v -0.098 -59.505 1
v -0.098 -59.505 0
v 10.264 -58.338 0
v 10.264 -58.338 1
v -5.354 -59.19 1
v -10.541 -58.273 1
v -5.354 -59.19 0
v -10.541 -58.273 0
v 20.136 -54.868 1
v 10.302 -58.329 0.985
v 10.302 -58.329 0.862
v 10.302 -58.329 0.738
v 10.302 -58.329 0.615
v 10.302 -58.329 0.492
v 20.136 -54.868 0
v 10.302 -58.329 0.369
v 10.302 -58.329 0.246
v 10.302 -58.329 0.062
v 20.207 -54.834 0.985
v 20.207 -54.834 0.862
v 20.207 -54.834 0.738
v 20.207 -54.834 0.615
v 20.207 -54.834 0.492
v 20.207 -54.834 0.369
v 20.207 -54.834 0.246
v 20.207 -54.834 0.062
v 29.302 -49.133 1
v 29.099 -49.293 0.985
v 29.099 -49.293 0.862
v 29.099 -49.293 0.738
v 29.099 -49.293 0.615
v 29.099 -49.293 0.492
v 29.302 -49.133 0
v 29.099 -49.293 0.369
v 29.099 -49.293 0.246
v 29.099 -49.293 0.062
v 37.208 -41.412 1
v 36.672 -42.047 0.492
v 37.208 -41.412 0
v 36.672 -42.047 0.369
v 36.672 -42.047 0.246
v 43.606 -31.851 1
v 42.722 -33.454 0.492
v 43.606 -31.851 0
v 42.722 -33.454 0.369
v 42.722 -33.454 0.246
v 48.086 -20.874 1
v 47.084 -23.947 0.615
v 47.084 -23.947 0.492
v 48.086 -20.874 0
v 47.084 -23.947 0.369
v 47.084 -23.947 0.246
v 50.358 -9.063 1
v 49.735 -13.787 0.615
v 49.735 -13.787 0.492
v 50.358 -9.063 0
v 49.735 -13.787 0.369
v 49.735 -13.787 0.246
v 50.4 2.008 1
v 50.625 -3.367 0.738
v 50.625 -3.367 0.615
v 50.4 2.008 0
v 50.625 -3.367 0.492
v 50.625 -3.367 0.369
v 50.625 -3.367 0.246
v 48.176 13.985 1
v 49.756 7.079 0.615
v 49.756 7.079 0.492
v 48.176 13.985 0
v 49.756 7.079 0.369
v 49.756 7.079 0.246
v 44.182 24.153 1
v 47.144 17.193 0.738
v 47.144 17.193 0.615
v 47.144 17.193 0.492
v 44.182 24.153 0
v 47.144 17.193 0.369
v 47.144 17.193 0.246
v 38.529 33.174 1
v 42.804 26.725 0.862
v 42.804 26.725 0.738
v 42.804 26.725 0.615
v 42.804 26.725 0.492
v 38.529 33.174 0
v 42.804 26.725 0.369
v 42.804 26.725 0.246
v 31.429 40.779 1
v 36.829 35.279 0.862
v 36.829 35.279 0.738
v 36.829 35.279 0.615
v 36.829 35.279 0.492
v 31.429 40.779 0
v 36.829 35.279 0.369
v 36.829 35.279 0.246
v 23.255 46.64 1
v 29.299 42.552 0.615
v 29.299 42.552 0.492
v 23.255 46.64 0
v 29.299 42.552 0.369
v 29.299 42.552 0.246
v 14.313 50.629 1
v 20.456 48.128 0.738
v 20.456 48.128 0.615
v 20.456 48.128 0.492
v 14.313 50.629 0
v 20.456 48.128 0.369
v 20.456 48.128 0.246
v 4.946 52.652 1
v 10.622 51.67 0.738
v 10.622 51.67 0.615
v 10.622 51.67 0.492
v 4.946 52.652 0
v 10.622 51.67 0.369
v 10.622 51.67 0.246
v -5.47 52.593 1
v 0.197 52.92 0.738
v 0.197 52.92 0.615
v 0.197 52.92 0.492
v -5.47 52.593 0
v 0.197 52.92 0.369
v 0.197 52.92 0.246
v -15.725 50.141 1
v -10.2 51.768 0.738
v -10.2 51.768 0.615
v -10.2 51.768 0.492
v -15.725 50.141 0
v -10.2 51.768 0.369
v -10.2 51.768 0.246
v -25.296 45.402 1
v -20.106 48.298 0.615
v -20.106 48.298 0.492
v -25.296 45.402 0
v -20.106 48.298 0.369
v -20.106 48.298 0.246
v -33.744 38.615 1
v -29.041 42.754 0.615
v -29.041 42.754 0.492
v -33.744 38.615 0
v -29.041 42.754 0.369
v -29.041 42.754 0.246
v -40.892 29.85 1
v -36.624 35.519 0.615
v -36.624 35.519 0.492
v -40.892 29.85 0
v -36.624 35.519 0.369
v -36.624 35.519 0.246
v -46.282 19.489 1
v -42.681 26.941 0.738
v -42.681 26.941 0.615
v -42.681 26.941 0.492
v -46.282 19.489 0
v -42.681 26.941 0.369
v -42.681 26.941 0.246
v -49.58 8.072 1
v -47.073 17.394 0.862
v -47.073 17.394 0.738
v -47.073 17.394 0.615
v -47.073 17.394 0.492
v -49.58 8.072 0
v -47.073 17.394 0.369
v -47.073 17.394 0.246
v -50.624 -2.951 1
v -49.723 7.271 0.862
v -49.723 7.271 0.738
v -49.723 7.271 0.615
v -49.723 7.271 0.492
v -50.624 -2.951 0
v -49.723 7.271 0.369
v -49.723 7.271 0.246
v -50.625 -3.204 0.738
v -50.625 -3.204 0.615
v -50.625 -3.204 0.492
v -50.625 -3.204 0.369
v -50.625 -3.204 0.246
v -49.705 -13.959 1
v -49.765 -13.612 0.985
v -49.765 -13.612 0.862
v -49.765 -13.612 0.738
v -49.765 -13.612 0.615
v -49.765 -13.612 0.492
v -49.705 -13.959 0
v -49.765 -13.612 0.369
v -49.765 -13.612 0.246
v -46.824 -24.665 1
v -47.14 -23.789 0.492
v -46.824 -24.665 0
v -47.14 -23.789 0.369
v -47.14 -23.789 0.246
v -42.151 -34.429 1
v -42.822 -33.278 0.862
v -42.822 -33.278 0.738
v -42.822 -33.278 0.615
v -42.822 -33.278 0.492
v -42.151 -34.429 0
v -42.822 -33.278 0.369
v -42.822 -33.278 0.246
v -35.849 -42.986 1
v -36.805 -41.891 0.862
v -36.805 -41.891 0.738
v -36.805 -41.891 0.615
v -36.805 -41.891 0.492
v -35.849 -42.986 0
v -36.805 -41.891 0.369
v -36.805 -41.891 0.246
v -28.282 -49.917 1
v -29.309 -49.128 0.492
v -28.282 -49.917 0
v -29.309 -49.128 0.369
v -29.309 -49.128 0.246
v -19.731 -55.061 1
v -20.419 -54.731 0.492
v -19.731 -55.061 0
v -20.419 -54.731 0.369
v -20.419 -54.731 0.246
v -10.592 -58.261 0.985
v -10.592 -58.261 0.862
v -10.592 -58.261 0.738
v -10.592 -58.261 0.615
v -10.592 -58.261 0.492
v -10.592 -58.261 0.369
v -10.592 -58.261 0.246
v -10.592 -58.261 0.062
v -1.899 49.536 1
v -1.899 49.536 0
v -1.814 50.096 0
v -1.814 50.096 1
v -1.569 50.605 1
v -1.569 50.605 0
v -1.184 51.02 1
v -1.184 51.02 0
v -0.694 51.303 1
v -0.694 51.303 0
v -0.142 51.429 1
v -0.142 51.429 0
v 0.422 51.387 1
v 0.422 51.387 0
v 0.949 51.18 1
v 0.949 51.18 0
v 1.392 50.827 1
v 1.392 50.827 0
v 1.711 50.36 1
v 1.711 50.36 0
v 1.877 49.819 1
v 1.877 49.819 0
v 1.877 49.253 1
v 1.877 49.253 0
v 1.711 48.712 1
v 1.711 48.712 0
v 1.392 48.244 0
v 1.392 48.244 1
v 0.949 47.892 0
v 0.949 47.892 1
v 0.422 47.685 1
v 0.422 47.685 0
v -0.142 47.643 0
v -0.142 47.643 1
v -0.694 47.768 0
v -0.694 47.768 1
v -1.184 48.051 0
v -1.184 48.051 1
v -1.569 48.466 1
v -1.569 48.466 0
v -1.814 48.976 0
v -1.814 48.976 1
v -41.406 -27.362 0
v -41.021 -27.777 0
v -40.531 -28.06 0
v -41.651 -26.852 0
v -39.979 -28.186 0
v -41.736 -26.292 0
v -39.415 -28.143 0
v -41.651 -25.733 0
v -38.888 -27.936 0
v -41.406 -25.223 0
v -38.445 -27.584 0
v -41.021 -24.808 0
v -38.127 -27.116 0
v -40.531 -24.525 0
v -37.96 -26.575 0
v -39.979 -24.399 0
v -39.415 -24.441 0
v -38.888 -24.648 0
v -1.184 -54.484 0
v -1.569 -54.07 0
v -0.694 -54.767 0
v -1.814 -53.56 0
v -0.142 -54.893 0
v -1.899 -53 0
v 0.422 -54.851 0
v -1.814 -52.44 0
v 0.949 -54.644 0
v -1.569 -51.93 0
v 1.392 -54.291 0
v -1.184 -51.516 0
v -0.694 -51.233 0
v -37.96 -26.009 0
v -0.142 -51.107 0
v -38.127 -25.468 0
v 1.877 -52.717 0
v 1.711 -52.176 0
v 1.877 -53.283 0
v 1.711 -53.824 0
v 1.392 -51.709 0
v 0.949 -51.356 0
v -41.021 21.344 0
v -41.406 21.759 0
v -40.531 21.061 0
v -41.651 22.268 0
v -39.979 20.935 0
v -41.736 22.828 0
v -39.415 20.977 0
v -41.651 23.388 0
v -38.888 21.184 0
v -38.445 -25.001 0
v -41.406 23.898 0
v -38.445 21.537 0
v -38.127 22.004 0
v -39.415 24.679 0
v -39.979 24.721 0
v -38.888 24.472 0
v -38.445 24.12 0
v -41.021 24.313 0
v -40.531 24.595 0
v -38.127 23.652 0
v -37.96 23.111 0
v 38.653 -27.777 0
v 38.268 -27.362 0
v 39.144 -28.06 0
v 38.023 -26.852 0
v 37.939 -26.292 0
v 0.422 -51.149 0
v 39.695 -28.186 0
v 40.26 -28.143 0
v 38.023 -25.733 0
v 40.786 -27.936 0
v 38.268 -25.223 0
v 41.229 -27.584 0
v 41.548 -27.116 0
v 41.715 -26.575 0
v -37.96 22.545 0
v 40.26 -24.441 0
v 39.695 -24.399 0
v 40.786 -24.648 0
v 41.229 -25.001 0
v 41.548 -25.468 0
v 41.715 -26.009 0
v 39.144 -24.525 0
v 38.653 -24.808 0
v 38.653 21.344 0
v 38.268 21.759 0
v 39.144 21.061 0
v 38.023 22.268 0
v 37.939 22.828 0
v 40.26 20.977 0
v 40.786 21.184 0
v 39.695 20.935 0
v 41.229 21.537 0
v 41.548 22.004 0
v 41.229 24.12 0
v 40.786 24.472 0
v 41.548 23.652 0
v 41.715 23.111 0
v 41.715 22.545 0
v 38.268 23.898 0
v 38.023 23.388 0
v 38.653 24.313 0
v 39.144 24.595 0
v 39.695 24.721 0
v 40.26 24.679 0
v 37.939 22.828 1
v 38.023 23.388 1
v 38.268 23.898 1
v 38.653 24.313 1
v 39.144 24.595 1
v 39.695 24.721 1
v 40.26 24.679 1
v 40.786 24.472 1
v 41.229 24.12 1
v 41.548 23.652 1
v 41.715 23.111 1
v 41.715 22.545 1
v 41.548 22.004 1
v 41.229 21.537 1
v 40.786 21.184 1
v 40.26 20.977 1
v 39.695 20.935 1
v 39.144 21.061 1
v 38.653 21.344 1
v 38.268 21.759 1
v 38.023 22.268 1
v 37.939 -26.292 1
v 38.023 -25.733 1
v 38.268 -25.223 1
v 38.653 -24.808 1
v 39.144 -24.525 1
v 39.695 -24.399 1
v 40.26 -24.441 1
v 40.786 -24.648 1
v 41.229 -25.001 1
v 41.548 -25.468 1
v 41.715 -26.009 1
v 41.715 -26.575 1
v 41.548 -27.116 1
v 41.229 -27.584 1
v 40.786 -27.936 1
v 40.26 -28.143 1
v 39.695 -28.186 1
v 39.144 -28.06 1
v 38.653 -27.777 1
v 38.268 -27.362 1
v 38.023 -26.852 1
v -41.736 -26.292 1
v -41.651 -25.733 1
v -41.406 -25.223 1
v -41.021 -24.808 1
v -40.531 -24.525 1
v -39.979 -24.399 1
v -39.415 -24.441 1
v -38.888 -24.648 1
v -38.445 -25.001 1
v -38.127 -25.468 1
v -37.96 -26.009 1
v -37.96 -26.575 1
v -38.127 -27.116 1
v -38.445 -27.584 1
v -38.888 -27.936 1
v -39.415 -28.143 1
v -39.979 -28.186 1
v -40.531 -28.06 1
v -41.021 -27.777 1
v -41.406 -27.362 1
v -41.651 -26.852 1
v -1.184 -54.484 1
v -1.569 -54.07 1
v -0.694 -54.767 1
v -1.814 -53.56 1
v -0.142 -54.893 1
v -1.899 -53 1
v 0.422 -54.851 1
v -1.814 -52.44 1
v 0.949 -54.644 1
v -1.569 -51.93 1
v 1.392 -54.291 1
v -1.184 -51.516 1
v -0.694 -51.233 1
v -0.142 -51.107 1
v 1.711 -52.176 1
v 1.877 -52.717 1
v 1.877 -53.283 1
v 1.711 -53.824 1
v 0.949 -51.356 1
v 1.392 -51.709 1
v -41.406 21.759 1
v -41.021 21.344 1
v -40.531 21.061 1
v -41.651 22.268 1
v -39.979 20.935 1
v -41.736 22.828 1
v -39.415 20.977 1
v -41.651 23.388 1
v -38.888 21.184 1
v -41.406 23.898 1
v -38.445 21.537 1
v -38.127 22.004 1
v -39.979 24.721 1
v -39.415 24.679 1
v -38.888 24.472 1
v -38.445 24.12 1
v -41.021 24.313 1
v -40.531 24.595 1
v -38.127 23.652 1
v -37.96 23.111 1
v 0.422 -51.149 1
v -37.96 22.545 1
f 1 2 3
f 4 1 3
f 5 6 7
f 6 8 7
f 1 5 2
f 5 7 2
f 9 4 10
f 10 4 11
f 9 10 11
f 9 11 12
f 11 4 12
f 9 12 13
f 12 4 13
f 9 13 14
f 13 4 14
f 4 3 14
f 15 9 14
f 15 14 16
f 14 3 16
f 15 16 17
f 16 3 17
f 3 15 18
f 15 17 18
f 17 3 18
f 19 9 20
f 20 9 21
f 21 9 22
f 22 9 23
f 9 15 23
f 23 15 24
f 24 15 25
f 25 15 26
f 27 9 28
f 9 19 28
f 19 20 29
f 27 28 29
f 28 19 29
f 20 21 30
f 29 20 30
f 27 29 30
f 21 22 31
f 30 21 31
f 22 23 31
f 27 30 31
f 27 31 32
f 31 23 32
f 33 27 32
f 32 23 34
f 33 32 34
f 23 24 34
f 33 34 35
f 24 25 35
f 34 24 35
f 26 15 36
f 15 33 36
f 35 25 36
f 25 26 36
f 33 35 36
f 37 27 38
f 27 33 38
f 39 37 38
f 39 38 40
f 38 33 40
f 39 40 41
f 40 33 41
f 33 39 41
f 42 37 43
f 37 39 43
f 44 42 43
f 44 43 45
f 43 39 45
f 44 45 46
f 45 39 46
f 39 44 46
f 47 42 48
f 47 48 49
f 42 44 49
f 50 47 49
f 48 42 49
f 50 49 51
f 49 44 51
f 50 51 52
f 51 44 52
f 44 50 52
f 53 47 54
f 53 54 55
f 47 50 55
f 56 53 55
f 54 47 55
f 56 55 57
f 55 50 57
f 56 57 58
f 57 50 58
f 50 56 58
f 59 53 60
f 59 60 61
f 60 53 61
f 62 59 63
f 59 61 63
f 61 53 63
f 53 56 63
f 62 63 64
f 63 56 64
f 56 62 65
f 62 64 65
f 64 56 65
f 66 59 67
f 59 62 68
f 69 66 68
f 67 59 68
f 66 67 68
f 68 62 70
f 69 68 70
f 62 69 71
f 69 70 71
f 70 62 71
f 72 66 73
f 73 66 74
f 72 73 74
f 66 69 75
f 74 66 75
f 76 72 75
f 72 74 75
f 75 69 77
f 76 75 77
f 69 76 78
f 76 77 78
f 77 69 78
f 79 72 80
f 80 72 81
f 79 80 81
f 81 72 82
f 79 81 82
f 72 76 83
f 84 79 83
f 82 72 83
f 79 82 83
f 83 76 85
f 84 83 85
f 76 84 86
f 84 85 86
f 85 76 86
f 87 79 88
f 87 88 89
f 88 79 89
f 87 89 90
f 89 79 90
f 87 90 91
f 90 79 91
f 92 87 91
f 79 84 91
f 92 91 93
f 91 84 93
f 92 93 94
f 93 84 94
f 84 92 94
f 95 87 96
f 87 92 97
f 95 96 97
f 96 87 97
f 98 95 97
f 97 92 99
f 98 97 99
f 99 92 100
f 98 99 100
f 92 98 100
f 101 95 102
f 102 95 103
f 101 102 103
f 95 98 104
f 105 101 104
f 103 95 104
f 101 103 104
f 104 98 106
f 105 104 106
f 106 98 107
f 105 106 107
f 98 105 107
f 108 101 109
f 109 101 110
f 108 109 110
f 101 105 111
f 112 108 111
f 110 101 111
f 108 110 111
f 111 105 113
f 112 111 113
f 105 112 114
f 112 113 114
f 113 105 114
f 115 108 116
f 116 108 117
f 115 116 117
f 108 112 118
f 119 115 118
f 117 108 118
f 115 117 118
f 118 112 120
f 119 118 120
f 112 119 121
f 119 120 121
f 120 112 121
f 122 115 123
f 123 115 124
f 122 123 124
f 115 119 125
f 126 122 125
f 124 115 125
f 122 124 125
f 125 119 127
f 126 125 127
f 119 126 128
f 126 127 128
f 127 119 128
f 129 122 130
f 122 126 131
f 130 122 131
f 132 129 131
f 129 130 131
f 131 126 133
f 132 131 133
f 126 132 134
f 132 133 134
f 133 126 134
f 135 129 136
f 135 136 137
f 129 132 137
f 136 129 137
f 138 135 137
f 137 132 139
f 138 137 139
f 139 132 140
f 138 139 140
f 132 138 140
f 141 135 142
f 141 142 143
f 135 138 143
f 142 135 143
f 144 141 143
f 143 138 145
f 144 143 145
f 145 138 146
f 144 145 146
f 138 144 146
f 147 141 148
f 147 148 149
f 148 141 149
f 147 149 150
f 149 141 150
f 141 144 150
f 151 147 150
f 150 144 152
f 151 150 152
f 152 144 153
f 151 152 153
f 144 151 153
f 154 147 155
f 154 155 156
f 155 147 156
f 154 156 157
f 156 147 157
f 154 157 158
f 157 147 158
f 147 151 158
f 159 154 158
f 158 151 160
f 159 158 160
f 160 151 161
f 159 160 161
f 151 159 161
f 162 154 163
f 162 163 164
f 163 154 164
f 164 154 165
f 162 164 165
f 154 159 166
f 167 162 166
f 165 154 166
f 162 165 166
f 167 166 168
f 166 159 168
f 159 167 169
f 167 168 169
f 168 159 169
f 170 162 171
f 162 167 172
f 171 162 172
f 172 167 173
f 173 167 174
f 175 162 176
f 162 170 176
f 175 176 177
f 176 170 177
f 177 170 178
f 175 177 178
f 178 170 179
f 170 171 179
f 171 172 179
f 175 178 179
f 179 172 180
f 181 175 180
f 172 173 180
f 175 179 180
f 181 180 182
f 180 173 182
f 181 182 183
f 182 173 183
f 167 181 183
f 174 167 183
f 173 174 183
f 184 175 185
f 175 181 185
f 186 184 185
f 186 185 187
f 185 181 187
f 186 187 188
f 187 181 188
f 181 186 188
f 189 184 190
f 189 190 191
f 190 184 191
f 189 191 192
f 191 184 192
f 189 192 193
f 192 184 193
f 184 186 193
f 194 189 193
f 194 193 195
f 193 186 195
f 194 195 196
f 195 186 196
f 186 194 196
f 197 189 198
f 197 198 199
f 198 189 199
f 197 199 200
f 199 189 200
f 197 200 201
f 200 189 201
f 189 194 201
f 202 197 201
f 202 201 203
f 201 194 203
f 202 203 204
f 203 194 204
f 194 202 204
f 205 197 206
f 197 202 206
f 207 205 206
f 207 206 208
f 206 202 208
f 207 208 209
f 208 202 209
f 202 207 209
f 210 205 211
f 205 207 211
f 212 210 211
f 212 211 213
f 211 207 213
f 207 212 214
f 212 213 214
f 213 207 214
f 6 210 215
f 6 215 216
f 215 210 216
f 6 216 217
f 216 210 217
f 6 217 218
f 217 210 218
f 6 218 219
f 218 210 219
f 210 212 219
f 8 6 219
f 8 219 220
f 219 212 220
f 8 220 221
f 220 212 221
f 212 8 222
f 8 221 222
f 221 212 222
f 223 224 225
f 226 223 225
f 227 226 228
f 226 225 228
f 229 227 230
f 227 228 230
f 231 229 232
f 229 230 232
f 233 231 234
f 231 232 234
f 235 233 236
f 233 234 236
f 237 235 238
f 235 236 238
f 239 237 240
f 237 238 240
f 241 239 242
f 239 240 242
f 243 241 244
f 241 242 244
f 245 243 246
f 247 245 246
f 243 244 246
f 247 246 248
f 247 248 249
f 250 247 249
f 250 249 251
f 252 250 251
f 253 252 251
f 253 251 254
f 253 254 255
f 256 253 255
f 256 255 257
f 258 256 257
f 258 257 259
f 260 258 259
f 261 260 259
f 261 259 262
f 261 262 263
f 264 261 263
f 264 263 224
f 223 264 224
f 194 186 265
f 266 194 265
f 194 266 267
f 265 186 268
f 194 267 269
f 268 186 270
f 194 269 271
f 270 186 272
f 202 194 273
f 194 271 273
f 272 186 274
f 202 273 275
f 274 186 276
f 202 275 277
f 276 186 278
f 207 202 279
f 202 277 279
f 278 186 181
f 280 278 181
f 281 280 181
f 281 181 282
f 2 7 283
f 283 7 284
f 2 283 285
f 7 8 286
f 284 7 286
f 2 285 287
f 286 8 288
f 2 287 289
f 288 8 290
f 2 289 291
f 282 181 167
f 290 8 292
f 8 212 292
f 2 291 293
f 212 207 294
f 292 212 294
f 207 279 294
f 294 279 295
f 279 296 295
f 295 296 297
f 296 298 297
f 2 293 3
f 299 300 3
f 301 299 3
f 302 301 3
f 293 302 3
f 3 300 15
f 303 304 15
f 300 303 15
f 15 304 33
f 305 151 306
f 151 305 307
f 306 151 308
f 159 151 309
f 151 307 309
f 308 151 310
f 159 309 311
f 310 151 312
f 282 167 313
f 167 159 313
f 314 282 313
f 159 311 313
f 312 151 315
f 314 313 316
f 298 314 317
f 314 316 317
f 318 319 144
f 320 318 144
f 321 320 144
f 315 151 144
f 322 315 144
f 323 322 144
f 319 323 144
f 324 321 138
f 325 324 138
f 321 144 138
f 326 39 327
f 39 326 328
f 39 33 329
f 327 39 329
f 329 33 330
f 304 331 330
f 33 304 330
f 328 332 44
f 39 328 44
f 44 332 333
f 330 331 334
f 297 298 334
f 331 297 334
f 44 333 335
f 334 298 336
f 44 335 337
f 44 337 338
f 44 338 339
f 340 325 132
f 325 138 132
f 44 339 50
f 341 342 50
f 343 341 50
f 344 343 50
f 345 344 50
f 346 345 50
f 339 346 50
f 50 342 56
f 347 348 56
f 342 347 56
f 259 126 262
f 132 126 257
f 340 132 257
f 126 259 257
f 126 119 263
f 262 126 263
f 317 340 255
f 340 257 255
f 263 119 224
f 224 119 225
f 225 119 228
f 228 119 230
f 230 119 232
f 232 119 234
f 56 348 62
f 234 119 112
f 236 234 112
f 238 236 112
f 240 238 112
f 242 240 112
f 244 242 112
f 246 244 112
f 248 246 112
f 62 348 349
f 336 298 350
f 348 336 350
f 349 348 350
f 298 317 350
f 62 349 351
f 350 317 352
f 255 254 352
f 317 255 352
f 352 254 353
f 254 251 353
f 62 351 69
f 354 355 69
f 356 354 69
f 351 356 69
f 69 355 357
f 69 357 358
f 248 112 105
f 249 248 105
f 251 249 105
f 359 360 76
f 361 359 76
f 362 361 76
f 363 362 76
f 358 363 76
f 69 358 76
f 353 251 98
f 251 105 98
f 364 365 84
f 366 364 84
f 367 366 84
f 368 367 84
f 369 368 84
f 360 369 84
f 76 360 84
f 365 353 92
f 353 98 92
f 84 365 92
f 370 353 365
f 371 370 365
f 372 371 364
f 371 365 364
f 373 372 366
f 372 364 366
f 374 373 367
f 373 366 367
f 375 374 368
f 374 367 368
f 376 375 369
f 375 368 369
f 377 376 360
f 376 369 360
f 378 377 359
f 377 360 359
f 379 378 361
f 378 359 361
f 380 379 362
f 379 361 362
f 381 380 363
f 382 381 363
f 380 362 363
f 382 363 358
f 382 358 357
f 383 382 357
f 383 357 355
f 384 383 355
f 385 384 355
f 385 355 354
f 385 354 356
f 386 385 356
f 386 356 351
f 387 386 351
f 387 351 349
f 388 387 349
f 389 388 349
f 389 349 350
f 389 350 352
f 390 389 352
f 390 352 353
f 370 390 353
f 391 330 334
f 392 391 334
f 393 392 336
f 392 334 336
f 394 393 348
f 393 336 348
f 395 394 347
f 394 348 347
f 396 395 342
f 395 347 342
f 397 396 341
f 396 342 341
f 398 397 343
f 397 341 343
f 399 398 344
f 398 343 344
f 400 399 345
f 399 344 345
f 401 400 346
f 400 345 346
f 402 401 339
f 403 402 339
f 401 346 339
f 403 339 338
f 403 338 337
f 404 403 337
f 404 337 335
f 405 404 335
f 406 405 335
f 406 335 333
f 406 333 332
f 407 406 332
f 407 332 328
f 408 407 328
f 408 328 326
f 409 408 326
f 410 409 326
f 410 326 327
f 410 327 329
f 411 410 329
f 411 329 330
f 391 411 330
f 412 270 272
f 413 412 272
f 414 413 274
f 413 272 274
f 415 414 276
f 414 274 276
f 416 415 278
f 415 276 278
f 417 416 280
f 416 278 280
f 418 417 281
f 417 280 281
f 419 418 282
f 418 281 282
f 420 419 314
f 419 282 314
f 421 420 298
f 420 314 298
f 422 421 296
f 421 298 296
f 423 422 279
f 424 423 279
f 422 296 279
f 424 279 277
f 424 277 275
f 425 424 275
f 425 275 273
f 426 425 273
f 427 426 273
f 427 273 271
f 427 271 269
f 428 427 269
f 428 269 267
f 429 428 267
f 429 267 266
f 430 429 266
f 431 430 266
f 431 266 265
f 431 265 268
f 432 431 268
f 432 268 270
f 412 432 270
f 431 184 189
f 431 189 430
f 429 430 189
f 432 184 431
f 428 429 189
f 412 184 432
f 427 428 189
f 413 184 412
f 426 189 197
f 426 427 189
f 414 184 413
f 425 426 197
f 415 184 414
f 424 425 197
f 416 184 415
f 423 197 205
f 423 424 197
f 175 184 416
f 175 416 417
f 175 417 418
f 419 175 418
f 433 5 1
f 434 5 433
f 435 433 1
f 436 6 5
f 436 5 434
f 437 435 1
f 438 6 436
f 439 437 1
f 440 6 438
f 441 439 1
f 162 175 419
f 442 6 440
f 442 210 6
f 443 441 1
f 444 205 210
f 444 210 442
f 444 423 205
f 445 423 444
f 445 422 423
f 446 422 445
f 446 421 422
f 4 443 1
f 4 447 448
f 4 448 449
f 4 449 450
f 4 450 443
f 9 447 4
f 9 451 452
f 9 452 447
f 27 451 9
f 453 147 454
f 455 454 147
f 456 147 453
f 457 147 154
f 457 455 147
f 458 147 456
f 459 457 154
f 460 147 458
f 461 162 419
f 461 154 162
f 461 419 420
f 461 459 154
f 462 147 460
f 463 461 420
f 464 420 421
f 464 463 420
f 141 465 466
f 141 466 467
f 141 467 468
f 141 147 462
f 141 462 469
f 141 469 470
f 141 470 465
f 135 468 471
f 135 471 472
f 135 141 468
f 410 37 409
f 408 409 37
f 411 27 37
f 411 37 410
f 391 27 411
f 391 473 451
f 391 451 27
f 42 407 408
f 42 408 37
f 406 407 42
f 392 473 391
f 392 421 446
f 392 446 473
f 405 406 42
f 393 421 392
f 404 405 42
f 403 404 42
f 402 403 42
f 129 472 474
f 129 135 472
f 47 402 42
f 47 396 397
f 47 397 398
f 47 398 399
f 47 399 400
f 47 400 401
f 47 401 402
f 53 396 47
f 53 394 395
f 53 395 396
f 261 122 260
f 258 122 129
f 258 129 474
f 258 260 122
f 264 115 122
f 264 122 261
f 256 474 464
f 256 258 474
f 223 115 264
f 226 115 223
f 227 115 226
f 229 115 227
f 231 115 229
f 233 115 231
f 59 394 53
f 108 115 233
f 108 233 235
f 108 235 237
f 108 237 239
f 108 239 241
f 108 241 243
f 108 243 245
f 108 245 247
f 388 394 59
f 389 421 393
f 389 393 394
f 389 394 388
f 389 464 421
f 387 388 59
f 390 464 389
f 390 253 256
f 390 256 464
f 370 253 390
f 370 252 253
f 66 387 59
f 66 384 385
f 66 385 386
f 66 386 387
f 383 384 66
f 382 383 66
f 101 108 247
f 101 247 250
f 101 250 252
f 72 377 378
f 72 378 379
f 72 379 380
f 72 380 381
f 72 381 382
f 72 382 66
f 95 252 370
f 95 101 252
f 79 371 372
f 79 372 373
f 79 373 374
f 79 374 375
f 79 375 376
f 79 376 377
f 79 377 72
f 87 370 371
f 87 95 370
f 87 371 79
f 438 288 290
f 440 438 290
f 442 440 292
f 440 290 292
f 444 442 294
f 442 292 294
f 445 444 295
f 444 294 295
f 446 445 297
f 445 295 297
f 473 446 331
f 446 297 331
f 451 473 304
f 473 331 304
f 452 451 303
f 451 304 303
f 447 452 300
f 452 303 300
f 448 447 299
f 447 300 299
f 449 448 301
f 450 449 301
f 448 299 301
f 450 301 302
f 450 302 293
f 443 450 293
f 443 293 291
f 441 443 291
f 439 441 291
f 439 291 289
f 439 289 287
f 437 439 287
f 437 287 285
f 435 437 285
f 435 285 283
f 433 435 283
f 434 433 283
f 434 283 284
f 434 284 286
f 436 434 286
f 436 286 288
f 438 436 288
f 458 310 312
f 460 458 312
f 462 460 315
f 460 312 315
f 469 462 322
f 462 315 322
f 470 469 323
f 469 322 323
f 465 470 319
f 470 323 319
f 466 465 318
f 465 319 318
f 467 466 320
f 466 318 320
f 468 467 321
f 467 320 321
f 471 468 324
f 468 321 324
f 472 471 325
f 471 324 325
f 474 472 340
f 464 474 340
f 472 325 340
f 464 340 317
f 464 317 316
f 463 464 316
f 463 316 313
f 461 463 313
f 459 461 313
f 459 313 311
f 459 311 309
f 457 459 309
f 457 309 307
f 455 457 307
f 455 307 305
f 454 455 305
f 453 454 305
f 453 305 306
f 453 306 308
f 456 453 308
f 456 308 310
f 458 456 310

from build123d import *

# Parameters (mm, degrees)
BOSS_EXTRUDE1_DEPTH   = 1
F_6_CLEARANCE_HOLE1_D = 3.7973


with BuildPart() as part:
    # Sketch2 → Boss-Extrude1 (new body)
    with BuildSketch(Plane.XY):
        with BuildLine():
            add(Edge.make_bspline(
                [(-0.098219478, -59.504960496), (3.436897561, -59.512574482), (6.902385574, -59.113542237), (12.00163576, -57.936921899), (13.684799406, -57.447571682), (17.01696053, -56.270438132), (18.634612927, -55.593764311), (23.350610632, -53.314567678), (26.314073008, -51.46447424), (31.882951557, -47.12160545), (34.399299567, -44.698764298), (37.808190417, -40.721626254), (38.883032168, -39.338283004), (40.403372211, -37.177066293), (40.893875715, -36.443472131), (41.835475697, -34.961682866), (42.287708493, -34.2119014), (44.458849611, -30.419906345), (45.90953731, -27.24931407), (47.671839201, -22.295401849), (48.191615054, -20.604334077), (49.075199253, -17.210830482), (49.441286028, -15.503804837), (50.322613559, -10.353288309), (50.620720413, -6.880330536), (50.626013179, -2.489282098), (50.608572779, -1.606657759), (50.53662485, 0.149624336), (50.37333489, 2.773285261), (50.04580771, 5.365022426), (49.176634833, 10.506877272), (48.311997128, 13.879346606), (46.852474957, 18.021318247), (46.540801081, 18.847888508), (45.884393662, 20.478127951), (45.539289659, 21.283060371), (44.453460732, 23.667406618), (43.662215028, 25.216367103), (41.088011362, 29.742409642), (39.105254571, 32.599055274), (36.259966059, 35.948733888), (35.671080887, 36.608999569), (34.469046359, 37.891487052), (33.854615044, 38.515316601), (31.971096091, 40.334584926), (30.661776584, 41.477794476), (27.936115294, 43.625276685), (26.519464998, 44.62914883), (24.310238358, 46.025581696), (23.559761765, 46.472796538), (22.029691758, 47.329426608), (21.248305297, 47.739683753), (17.285661626, 49.682954527), (14.00765298, 50.863255982), (8.929001037, 52.0729348), (7.209032332, 52.382196161), (4.586415661, 52.698075517), (3.703429851, 52.778602256), (1.947001053, 52.887584039), (1.070792684, 52.916474811), (-3.300409503, 52.935359105), (-6.766182641, 52.552450553), (-11.059069639, 51.571909237), (-11.917186291, 51.349987666), (-13.608240345, 50.860915408), (-14.443658358, 50.593322204), (-16.920492094, 49.723439489), (-18.532519195, 49.054119139), (-21.680381495, 47.541696652), (-23.216502951, 46.699247424), (-25.463058735, 45.304136794), (-26.201985439, 44.817175832), (-27.644413593, 43.811097409), (-28.350082581, 43.290681866), (-31.803770535, 40.605152436), (-34.328117371, 38.190017416), (-37.197557306, 34.851414441), (-37.757689344, 34.166650306), (-38.8385265, 32.778419928), (-39.360600883, 32.073473438), (-40.87358044, 29.927196367), (-41.811263511, 28.454440878), (-43.549814588, 25.428147651), (-44.351144374, 23.874882571), (-45.450758837, 21.484534709), (-45.800228369, 20.677673946), (-46.464946153, 19.043746517), (-46.778638512, 18.220393765), (-48.251656367, 14.086774621), (-49.130626655, 10.711540313), (-50.019665398, 5.550687541), (-50.24444942, 3.81407138), (-50.471014482, 1.183903546), (-50.528035221, 0.302196196), (-50.604282959, -1.453716399), (-50.623719259, -2.329854837), (-50.629816849, -6.701686712), (-50.343410551, -10.170817116), (-49.475529335, -15.331879221), (-49.113284607, -17.045136846), (-48.454343975, -19.603780705), (-48.21552344, -20.453924473), (-47.70399006, -22.133572475), (-47.430761413, -22.96516725), (-45.978832083, -27.082713054), (-44.543033628, -30.247502648), (-41.961585357, -34.793102732), (-41.029976364, -36.274783385), (-39.517329037, -38.442998574), (-38.994293998, -39.155828142), (-37.92165514, -40.546535368), (-37.370622739, -41.226511572), (-34.542992957, -44.550652164), (-32.049200166, -46.967812592), (-28.624332781, -49.667744315), (-27.923878427, -50.191550667), (-26.490792265, -51.20553278), (-25.756352373, -51.696833094), (-23.515297982, -53.110508305), (-21.985194241, -53.96426979), (-17.288093174, -56.262961801), (-14.01546581, -57.448151806), (-9.735563333, -58.464604177), (-8.86764039, -58.644870167), (-7.127462632, -58.953940787), (-6.254828129, -59.083022027), (-4.50450795, -59.290677091), (-3.62681671, -59.369195272), (-1.866349861, -59.47539228), (-0.981998738, -59.503056999), (-0.098219478, -59.504960496)],
                knots=[0, 0, 0, 0, 0.03125, 0.03125, 0.046875, 0.046875, 0.0625, 0.0625, 0.09375, 0.09375, 0.125, 0.125, 0.140625, 0.140625, 0.1484375, 0.1484375, 0.15625, 0.15625, 0.1875, 0.1875, 0.203125, 0.203125, 0.21875, 0.21875, 0.25, 0.25, 0.2578125, 0.2578125, 0.265625, 0.28125, 0.28125, 0.3125, 0.3125, 0.3203125, 0.3203125, 0.328125, 0.328125, 0.34375, 0.34375, 0.375, 0.375, 0.3828125, 0.3828125, 0.390625, 0.390625, 0.40625, 0.40625, 0.421875, 0.421875, 0.4296875, 0.4296875, 0.4375, 0.4375, 0.46875, 0.46875, 0.484375, 0.484375, 0.4921875, 0.4921875, 0.5, 0.5, 0.53125, 0.53125, 0.5390625, 0.5390625, 0.546875, 0.546875, 0.5625, 0.5625, 0.578125, 0.578125, 0.5859375, 0.5859375, 0.59375, 0.59375, 0.625, 0.625, 0.6328125, 0.6328125, 0.640625, 0.640625, 0.65625, 0.65625, 0.671875, 0.671875, 0.6796875, 0.6796875, 0.6875, 0.6875, 0.71875, 0.71875, 0.734375, 0.734375, 0.7421875, 0.7421875, 0.75, 0.75, 0.78125, 0.78125, 0.796875, 0.796875, 0.8046875, 0.8046875, 0.8125, 0.8125, 0.84375, 0.84375, 0.859375, 0.859375, 0.8671875, 0.8671875, 0.875, 0.875, 0.90625, 0.90625, 0.9140625, 0.9140625, 0.921875, 0.921875, 0.9375, 0.9375, 0.96875, 0.96875, 0.9765625, 0.9765625, 0.984375, 0.984375, 0.9921875, 0.9921875, 1, 1, 1, 1], degree=3))
        make_face()
    extrude(amount=BOSS_EXTRUDE1_DEPTH)

    # #6 Clearance Hole1 (through all)
    with Locations(Plane.XY.offset(1)):
        with Locations((0, 49.535898385), (39.837168574, 22.828093358), (-39.837168574, 22.828093358), (-39.837168574, -26.292194973), (0, -53), (39.837168574, -26.292194973)):
            Hole(F_6_CLEARANCE_HOLE1_D / 2)


solid = part.part
